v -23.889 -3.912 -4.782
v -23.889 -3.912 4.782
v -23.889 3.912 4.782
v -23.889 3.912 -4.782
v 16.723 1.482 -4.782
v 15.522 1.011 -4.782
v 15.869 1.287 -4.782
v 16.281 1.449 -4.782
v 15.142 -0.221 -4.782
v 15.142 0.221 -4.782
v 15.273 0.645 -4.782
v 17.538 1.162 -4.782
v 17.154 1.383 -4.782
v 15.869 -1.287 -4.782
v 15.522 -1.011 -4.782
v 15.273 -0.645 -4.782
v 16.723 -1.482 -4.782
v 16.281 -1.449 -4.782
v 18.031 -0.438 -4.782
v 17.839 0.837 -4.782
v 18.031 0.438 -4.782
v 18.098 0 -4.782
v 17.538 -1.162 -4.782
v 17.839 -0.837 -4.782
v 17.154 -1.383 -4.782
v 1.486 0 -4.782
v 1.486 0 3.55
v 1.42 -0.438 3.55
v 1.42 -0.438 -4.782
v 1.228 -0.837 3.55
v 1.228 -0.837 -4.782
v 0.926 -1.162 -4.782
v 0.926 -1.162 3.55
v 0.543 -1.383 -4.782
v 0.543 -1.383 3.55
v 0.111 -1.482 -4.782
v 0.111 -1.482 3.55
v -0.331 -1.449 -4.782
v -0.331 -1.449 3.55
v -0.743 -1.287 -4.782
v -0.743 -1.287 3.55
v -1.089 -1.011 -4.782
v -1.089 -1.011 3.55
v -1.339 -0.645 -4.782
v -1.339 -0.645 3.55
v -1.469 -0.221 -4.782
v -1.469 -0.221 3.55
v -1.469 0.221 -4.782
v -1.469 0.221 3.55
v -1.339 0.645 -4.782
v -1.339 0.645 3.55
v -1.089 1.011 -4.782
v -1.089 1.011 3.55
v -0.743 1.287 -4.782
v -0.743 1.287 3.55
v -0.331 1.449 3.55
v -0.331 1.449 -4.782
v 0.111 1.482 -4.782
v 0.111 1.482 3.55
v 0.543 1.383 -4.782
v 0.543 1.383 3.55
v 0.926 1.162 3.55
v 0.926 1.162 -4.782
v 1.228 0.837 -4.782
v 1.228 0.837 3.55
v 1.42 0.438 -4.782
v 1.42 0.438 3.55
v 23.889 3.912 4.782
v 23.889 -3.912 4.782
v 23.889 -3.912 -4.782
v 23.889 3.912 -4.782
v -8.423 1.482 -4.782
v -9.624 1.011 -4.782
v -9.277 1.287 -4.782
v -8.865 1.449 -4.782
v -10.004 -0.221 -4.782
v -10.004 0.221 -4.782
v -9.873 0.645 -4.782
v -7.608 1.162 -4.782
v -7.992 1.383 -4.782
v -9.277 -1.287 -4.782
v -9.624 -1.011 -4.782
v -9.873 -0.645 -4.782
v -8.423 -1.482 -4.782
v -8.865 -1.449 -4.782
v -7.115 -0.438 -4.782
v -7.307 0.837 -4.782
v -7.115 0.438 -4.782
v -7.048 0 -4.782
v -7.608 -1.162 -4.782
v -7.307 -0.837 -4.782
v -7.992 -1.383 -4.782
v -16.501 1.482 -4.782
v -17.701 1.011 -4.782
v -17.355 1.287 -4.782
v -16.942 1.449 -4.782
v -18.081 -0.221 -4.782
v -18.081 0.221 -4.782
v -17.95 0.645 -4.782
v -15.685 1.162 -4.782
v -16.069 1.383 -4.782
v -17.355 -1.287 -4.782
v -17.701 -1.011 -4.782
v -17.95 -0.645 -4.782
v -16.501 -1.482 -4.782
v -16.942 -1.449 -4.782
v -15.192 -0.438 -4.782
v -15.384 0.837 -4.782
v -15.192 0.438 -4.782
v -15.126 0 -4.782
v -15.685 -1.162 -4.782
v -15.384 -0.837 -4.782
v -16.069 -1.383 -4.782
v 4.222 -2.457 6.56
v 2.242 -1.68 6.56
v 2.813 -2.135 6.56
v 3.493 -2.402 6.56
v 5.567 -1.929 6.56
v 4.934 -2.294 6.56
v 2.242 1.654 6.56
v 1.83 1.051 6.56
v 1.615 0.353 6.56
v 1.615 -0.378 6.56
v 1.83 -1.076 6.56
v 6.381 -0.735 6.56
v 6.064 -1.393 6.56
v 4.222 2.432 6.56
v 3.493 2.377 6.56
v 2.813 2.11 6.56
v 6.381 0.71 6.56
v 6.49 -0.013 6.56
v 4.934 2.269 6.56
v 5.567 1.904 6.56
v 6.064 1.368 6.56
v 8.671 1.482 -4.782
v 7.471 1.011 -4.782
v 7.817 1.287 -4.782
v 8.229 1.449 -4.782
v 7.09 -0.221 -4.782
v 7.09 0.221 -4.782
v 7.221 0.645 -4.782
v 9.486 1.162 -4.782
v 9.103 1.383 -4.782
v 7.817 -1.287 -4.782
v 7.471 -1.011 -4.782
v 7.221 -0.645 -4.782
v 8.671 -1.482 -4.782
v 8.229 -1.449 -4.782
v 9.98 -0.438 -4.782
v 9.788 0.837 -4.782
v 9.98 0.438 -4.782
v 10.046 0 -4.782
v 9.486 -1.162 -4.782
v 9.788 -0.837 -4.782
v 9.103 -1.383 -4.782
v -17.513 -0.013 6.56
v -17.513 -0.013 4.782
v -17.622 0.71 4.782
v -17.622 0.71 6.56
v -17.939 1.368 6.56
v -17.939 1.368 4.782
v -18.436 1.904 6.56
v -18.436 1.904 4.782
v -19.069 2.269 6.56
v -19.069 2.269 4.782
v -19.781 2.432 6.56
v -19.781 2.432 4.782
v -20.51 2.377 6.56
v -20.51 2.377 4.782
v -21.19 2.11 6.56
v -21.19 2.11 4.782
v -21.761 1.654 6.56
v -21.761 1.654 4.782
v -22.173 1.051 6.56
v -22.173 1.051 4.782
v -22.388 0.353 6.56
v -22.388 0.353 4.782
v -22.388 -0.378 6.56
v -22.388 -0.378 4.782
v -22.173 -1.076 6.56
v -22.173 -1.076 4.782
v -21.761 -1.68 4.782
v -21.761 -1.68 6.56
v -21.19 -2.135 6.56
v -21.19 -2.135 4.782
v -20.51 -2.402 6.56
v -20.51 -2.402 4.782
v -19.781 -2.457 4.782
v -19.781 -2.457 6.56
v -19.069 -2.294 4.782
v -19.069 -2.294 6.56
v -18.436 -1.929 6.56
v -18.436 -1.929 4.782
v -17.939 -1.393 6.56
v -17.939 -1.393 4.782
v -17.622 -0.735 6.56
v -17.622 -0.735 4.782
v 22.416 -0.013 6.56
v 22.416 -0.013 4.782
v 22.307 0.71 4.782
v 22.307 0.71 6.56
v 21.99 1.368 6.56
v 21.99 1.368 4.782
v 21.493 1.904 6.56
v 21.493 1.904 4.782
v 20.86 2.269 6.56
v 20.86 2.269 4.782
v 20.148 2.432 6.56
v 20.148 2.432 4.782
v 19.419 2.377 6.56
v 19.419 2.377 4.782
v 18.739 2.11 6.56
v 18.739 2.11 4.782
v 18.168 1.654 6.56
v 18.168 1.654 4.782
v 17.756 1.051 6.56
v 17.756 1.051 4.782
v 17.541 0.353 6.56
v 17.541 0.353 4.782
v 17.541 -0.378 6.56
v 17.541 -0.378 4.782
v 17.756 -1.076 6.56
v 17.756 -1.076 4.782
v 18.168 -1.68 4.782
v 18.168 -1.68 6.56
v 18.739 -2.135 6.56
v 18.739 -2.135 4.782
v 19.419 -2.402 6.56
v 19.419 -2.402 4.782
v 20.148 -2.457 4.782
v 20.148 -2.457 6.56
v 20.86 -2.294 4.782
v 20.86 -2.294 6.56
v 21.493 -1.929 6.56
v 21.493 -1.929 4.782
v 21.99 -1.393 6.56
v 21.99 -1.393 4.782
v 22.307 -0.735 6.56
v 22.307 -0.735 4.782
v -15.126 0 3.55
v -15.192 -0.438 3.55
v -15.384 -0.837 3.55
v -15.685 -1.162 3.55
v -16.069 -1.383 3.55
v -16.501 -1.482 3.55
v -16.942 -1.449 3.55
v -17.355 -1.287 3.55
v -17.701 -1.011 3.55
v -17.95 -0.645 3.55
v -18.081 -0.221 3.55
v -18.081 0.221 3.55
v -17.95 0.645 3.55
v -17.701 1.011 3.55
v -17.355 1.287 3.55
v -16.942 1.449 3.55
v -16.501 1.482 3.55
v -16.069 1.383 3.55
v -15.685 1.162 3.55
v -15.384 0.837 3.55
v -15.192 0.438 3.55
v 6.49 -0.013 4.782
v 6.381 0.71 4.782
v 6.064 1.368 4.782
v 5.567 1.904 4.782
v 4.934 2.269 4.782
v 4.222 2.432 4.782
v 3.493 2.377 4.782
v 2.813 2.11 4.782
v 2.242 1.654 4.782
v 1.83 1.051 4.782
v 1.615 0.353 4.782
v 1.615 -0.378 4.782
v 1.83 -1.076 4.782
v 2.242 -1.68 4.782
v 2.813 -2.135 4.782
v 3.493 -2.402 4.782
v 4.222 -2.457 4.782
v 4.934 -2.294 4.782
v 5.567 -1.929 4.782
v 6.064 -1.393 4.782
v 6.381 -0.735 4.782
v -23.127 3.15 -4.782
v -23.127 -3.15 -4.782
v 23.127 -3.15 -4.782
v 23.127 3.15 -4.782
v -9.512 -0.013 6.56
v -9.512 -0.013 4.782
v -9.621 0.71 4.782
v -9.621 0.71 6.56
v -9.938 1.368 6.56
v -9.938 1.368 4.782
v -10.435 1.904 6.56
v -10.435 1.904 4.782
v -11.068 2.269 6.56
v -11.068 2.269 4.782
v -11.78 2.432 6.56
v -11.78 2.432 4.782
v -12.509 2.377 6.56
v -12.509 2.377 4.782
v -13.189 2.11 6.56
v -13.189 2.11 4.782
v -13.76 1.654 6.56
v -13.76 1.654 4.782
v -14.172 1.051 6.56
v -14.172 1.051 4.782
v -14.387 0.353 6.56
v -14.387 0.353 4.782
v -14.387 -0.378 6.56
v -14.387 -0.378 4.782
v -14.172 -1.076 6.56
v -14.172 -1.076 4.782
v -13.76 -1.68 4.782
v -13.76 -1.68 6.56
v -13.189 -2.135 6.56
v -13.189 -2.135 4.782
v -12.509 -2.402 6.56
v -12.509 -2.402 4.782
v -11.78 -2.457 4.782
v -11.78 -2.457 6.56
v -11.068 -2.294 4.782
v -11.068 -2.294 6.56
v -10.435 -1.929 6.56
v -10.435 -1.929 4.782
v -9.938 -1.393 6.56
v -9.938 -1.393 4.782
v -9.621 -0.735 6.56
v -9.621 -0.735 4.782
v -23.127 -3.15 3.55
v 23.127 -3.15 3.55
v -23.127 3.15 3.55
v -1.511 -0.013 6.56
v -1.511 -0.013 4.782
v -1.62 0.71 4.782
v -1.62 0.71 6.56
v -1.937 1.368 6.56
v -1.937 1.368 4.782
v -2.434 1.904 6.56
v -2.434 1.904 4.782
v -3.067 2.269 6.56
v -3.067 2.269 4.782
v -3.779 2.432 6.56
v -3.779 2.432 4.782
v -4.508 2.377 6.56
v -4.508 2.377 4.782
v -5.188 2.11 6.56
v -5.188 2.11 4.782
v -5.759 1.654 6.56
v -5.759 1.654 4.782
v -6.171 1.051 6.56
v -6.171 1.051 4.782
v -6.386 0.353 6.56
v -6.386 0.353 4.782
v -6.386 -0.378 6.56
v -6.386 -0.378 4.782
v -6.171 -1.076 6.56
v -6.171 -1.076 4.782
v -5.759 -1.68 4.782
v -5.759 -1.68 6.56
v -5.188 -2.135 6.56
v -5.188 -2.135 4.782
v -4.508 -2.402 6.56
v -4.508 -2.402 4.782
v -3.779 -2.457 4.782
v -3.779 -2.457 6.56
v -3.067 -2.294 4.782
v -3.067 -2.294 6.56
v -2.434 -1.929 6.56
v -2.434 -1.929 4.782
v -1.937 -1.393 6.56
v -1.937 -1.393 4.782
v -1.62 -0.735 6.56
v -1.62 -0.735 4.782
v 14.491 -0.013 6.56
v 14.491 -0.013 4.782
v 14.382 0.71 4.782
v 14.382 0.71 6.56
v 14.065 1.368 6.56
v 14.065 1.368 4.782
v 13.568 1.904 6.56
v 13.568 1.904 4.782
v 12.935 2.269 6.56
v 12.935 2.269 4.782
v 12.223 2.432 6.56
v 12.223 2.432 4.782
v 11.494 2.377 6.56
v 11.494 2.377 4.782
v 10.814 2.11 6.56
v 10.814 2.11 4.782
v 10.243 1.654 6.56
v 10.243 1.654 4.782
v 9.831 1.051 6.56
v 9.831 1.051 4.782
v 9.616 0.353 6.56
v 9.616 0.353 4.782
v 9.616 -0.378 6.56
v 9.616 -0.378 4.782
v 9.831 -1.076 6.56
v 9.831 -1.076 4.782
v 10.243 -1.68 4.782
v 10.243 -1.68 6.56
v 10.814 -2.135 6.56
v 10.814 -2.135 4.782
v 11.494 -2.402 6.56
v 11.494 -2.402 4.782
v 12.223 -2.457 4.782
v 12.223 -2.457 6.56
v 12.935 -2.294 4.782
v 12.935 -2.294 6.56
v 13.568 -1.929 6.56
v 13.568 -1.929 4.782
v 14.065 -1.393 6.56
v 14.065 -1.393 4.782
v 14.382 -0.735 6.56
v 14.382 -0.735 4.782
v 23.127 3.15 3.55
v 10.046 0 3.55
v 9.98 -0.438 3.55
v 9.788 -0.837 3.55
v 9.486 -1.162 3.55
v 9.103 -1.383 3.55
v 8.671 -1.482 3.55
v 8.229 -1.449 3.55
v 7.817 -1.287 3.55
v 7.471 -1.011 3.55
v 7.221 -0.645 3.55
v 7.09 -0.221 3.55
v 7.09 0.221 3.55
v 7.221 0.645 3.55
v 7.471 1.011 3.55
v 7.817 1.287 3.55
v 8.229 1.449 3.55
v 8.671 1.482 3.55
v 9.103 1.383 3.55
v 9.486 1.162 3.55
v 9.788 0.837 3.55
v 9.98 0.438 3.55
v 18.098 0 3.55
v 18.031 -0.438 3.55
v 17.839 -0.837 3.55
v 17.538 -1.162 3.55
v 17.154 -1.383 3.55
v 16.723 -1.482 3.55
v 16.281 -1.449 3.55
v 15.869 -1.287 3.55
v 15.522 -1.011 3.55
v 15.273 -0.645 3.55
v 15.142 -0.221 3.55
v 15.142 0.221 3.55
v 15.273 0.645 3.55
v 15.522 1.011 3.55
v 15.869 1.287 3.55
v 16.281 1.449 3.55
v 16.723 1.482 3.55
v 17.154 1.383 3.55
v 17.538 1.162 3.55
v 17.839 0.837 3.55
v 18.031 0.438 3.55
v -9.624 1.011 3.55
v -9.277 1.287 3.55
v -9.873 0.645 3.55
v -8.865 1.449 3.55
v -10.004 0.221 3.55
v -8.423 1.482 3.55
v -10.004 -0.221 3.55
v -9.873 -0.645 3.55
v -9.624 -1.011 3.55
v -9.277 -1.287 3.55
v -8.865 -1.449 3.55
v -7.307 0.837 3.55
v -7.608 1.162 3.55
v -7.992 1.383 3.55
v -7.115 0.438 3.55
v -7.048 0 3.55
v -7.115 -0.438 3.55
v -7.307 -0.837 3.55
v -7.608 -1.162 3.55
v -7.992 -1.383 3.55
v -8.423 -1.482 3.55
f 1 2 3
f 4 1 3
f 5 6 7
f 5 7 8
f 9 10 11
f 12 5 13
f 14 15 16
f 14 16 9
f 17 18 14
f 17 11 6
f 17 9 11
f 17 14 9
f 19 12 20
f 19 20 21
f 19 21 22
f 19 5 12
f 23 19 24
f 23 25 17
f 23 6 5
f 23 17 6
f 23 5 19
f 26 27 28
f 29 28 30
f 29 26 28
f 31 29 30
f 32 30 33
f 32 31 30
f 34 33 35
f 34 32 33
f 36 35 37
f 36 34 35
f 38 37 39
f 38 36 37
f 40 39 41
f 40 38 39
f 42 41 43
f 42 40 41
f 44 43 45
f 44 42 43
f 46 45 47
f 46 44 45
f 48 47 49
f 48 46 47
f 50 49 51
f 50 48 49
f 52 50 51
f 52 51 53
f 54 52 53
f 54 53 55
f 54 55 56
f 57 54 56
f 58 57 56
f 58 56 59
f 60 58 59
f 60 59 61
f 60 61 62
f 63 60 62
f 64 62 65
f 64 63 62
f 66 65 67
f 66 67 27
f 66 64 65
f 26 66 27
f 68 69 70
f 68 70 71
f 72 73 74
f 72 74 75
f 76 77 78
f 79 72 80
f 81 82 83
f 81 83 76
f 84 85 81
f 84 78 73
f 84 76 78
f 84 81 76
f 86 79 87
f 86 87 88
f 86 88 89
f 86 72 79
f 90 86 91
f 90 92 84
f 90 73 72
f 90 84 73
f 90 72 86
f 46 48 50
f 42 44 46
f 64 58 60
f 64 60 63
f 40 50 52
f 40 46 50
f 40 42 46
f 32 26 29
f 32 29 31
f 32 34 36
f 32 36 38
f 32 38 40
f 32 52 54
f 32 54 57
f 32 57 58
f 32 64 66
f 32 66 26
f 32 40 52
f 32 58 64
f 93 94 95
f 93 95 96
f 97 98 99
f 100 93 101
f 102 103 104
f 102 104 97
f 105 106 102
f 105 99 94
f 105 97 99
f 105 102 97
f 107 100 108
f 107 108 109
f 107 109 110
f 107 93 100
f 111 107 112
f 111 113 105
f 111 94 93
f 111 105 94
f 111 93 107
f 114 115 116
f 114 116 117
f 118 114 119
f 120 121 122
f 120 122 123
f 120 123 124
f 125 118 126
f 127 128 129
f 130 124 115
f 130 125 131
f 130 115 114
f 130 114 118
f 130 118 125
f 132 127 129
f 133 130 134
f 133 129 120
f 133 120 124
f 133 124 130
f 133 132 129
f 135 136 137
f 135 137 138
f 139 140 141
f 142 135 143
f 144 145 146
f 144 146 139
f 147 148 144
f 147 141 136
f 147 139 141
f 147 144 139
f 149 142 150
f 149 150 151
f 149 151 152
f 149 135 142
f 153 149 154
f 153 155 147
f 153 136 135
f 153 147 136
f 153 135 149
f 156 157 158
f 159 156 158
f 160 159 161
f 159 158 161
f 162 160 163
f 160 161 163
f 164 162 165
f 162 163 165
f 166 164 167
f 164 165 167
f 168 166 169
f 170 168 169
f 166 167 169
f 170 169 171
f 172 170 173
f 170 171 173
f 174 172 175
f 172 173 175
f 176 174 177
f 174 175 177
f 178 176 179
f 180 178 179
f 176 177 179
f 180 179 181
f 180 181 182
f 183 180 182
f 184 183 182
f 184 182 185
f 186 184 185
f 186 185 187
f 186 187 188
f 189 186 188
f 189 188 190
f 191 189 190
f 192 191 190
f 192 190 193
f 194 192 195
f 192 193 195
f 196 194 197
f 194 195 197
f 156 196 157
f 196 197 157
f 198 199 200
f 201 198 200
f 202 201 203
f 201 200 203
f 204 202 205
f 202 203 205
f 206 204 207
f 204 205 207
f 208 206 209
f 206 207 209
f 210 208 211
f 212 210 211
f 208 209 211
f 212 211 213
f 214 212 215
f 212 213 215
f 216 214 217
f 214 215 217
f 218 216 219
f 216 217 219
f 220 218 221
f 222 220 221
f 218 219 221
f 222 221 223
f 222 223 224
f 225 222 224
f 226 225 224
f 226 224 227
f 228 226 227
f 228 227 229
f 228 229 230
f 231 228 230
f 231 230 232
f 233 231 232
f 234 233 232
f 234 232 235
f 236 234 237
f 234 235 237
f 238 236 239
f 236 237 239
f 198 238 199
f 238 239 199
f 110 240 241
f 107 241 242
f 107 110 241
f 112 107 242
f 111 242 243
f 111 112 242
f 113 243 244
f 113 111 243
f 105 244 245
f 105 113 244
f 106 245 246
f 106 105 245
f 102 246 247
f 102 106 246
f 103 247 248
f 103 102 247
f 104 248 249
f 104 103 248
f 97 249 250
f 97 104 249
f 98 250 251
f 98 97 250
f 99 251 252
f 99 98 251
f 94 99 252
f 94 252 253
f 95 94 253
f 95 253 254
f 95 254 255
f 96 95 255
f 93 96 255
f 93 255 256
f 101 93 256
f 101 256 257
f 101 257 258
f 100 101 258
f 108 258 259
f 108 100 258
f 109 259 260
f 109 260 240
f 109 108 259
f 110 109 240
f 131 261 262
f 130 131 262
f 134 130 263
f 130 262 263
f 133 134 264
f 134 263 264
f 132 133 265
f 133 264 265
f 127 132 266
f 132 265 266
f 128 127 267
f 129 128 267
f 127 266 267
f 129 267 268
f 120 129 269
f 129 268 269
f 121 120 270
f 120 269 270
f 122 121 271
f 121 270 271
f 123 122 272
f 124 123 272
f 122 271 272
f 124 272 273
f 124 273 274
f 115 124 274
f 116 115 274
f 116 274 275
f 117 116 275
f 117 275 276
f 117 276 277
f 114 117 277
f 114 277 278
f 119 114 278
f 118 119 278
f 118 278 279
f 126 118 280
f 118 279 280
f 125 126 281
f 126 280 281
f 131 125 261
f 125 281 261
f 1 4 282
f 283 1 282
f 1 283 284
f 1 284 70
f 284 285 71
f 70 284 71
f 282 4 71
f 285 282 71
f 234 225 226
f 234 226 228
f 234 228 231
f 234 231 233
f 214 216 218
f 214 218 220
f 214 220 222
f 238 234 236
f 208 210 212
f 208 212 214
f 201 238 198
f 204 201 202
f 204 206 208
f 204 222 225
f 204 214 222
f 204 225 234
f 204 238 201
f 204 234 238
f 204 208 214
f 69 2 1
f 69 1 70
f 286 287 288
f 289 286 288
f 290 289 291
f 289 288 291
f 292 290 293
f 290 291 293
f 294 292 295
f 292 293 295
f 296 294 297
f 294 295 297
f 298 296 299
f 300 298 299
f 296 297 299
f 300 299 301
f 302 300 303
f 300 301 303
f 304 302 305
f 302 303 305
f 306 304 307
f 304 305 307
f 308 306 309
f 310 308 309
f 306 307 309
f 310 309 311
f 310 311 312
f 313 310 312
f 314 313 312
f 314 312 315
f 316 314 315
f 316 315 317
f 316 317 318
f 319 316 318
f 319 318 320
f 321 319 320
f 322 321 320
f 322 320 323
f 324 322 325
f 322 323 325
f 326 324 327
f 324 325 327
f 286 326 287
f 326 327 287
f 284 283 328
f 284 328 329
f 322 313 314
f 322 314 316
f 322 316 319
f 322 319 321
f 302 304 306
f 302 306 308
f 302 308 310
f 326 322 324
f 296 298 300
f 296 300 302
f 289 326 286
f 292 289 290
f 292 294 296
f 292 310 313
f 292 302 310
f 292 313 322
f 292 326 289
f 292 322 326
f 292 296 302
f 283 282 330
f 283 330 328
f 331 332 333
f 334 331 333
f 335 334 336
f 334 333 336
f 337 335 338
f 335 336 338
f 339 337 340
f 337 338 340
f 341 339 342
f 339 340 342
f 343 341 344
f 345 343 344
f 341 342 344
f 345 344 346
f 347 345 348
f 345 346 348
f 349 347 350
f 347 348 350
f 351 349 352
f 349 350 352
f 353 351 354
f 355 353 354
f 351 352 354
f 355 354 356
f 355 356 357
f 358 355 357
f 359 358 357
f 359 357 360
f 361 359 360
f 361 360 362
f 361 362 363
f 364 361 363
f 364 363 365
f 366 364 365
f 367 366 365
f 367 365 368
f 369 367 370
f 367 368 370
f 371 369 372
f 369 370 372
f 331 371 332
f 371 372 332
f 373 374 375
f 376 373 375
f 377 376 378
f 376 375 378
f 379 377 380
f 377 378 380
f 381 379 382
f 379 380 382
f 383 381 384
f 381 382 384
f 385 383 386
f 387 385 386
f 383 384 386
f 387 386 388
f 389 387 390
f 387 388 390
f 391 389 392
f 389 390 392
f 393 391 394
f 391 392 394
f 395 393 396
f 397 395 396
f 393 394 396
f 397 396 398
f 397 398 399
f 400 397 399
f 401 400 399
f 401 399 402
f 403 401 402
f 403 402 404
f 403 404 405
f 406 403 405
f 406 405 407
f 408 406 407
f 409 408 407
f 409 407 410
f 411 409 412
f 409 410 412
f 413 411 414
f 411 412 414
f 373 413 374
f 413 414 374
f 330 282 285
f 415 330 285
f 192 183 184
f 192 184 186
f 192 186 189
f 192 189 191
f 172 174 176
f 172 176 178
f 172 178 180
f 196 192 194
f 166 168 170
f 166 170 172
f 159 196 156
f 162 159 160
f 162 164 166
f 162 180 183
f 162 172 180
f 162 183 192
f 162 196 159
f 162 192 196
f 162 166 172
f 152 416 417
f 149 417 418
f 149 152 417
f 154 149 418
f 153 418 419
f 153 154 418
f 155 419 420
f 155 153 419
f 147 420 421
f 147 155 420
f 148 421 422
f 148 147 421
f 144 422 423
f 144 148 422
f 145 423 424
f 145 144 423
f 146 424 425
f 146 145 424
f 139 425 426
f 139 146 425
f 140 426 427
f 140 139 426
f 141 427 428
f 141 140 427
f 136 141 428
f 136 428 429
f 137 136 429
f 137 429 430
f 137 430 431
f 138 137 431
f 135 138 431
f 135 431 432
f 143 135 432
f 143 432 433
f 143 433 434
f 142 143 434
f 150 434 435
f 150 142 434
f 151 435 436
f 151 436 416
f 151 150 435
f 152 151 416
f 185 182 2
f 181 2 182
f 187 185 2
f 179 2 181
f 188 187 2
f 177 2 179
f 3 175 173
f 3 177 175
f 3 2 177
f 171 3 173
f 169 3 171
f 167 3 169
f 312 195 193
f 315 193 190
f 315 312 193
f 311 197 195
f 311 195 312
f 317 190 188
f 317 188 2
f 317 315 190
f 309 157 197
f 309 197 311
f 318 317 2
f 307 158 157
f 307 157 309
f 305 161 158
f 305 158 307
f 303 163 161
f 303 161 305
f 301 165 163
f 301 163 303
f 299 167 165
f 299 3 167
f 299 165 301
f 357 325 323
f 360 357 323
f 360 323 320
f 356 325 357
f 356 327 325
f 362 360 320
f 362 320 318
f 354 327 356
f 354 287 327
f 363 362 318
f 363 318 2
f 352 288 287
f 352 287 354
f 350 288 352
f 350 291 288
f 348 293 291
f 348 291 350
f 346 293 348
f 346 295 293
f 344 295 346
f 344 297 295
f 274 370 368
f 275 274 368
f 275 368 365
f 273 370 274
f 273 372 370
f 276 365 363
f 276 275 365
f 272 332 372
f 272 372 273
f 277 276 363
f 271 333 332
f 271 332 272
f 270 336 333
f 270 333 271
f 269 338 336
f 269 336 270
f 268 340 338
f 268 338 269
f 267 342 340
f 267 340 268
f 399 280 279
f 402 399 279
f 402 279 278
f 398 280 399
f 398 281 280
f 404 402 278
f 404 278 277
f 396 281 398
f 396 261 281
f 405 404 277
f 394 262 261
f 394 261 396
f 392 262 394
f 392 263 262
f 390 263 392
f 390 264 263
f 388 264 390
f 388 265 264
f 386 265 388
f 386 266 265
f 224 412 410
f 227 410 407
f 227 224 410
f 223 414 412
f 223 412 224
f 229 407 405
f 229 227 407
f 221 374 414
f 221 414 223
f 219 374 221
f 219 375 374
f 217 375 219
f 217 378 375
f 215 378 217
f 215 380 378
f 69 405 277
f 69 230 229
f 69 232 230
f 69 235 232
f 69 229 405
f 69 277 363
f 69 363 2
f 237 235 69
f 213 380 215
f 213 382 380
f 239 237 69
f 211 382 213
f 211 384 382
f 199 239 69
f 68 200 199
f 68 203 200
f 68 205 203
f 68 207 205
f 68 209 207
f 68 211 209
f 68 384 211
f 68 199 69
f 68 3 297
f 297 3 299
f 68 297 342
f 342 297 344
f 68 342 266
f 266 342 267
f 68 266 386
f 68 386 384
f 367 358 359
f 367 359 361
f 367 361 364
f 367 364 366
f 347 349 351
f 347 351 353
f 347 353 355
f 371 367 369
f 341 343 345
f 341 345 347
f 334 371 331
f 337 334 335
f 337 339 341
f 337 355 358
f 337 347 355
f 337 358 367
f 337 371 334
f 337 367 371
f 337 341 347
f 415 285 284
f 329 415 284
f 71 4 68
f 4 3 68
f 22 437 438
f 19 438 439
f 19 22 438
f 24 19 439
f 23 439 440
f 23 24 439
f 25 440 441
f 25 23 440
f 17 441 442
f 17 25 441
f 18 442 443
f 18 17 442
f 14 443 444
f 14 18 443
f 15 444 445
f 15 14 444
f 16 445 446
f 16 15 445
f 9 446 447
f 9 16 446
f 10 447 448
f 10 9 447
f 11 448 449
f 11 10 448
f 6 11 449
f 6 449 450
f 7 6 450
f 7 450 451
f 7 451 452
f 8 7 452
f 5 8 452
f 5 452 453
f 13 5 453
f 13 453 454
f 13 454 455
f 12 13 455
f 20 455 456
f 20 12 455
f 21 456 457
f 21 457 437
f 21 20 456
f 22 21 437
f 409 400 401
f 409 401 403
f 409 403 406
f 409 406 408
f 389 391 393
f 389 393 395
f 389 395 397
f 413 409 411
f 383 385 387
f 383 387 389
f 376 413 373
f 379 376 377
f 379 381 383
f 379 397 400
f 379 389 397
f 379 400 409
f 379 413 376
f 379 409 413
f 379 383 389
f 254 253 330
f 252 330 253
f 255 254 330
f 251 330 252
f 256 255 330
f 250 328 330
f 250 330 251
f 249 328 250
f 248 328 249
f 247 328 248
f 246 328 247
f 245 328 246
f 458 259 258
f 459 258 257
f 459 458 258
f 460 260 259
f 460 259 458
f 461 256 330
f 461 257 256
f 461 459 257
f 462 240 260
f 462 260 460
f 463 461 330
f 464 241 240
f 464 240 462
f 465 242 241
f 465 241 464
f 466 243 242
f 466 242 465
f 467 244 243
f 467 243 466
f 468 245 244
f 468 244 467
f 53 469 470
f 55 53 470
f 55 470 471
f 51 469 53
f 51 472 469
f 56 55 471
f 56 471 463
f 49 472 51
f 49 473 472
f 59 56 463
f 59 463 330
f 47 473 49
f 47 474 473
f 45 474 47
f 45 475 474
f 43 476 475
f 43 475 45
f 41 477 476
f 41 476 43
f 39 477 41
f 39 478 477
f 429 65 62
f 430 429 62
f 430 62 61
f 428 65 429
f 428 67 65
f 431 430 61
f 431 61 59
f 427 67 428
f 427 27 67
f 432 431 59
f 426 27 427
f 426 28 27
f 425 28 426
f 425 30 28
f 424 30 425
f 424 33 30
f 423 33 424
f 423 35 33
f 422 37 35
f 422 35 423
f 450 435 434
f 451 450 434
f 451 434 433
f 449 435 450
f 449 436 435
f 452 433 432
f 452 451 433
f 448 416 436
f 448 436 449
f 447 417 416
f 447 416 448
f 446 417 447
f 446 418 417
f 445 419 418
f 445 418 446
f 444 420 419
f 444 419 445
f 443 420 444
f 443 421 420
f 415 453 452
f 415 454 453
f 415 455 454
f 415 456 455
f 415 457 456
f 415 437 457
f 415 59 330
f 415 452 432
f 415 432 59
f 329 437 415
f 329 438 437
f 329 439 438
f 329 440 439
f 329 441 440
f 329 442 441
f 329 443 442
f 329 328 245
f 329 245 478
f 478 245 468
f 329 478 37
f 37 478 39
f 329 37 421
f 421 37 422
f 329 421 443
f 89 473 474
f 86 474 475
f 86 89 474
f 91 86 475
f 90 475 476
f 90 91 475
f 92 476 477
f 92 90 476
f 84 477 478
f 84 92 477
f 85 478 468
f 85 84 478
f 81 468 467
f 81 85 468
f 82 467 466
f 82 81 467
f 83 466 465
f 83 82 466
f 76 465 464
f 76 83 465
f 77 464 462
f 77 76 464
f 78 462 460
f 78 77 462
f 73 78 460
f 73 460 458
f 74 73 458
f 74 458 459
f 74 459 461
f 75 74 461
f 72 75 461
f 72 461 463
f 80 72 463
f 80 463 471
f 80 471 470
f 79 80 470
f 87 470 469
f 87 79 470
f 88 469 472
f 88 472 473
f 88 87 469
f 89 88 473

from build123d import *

# Parameters (mm, degrees)
F0_W      = 47.7774
F0_H      = 7.8232
F1_DEPTH  = 4.78155
F2_R      = 2.4511
F8_DEPTH  = 1.778
F3_R      = 2.4511
F9_DEPTH  = 1.778
F4_R      = 2.4511
F10_DEPTH = 1.778
F5_R      = 2.4511
F11_DEPTH = 1.778
F6_R      = 2.4511
F12_DEPTH = 1.778
F7_R      = 2.4511
F13_DEPTH = 1.778
F14_W     = 46.2534
F14_H     = 6.2992
F20_DEPTH = 8.3312
F15_R     = 1.4859
F21_DEPTH = 8.3312
F16_R     = 1.4859
F22_DEPTH = 8.3312
F17_R     = 1.4859
F23_DEPTH = 8.3312
F19_R     = 1.4859
F24_DEPTH = 8.3312
F18_R     = 1.4859
F25_DEPTH = 8.3312


with BuildPart() as f1:
    # F0 (on Top) → F1 (new body, symmetric)
    with BuildSketch(Plane.XY):
        Rectangle(F0_W, F0_H)
    extrude(amount=F1_DEPTH, both=True)

    # F2 (on face) → F8 (join)
    with BuildSketch(Plane.XY.offset(4.78155)):
        with Locations((-19.9644, -0.0127)):
            Circle(F2_R)
    extrude(amount=F8_DEPTH)

    # F3 (on face) → F9 (join)
    with BuildSketch(Plane.XY.offset(4.78155)):
        with Locations((-11.9634, -0.0127)):
            Circle(F3_R)
    extrude(amount=F9_DEPTH)

    # F4 (on face) → F10 (join)
    with BuildSketch(Plane.XY.offset(4.78155)):
        with Locations((-3.9624, -0.0127)):
            Circle(F4_R)
    extrude(amount=F10_DEPTH)

    # F5 (on face) → F11 (join)
    with BuildSketch(Plane.XY.offset(4.78155)):
        with Locations((4.0386, -0.0127)):
            Circle(F5_R)
    extrude(amount=F11_DEPTH)

    # F6 (on face) → F12 (join)
    with BuildSketch(Plane.XY.offset(4.78155)):
        with Locations((12.0396, -0.0127)):
            Circle(F6_R)
    extrude(amount=F12_DEPTH)

    # F7 (on face) → F13 (join)
    with BuildSketch(Plane.XY.offset(4.78155)):
        with Locations((19.9644, -0.0127)):
            Circle(F7_R)
    extrude(amount=F13_DEPTH)

    # F14 (on face) → F20 (cut)
    with BuildSketch(Plane(origin=(0, 0, -4.78155), x_dir=(1, 0, 0), z_dir=(0, 0, -1))):
        Rectangle(F14_W, F14_H)
    extrude(amount=-F20_DEPTH, mode=Mode.SUBTRACT)

    # F15 (on face) → F21 (join)
    with BuildSketch(Plane(origin=(0, 0, -4.78155), x_dir=(1, 0, 0), z_dir=(0, 0, -1))):
        with Locations((-16.6116, 0)):
            Circle(F15_R)
    extrude(amount=-F21_DEPTH)

    # F16 (on face) → F22 (join)
    with BuildSketch(Plane(origin=(0, 0, -4.78155), x_dir=(1, 0, 0), z_dir=(0, 0, -1))):
        with Locations((-8.5344, 0)):
            Circle(F16_R)
    extrude(amount=-F22_DEPTH)

    # F17 (on face) → F23 (join)
    with BuildSketch(Plane(origin=(0, 0, -4.78155), x_dir=(1, 0, 0), z_dir=(0, 0, -1))):
        Circle(F17_R)
    extrude(amount=-F23_DEPTH)

    # F19 (on face) → F24 (join)
    with BuildSketch(Plane(origin=(0, 0, -4.78155), x_dir=(1, 0, 0), z_dir=(0, 0, -1))):
        with Locations((8.5598, 0)):
            Circle(F19_R)
    extrude(amount=-F24_DEPTH)

    # F18 (on face) → F25 (join)
    with BuildSketch(Plane(origin=(0, 0, -4.78155), x_dir=(1, 0, 0), z_dir=(0, 0, -1))):
        with Locations((16.6116, 0)):
            Circle(F18_R)
    extrude(amount=-F25_DEPTH)


solid = f1.part
